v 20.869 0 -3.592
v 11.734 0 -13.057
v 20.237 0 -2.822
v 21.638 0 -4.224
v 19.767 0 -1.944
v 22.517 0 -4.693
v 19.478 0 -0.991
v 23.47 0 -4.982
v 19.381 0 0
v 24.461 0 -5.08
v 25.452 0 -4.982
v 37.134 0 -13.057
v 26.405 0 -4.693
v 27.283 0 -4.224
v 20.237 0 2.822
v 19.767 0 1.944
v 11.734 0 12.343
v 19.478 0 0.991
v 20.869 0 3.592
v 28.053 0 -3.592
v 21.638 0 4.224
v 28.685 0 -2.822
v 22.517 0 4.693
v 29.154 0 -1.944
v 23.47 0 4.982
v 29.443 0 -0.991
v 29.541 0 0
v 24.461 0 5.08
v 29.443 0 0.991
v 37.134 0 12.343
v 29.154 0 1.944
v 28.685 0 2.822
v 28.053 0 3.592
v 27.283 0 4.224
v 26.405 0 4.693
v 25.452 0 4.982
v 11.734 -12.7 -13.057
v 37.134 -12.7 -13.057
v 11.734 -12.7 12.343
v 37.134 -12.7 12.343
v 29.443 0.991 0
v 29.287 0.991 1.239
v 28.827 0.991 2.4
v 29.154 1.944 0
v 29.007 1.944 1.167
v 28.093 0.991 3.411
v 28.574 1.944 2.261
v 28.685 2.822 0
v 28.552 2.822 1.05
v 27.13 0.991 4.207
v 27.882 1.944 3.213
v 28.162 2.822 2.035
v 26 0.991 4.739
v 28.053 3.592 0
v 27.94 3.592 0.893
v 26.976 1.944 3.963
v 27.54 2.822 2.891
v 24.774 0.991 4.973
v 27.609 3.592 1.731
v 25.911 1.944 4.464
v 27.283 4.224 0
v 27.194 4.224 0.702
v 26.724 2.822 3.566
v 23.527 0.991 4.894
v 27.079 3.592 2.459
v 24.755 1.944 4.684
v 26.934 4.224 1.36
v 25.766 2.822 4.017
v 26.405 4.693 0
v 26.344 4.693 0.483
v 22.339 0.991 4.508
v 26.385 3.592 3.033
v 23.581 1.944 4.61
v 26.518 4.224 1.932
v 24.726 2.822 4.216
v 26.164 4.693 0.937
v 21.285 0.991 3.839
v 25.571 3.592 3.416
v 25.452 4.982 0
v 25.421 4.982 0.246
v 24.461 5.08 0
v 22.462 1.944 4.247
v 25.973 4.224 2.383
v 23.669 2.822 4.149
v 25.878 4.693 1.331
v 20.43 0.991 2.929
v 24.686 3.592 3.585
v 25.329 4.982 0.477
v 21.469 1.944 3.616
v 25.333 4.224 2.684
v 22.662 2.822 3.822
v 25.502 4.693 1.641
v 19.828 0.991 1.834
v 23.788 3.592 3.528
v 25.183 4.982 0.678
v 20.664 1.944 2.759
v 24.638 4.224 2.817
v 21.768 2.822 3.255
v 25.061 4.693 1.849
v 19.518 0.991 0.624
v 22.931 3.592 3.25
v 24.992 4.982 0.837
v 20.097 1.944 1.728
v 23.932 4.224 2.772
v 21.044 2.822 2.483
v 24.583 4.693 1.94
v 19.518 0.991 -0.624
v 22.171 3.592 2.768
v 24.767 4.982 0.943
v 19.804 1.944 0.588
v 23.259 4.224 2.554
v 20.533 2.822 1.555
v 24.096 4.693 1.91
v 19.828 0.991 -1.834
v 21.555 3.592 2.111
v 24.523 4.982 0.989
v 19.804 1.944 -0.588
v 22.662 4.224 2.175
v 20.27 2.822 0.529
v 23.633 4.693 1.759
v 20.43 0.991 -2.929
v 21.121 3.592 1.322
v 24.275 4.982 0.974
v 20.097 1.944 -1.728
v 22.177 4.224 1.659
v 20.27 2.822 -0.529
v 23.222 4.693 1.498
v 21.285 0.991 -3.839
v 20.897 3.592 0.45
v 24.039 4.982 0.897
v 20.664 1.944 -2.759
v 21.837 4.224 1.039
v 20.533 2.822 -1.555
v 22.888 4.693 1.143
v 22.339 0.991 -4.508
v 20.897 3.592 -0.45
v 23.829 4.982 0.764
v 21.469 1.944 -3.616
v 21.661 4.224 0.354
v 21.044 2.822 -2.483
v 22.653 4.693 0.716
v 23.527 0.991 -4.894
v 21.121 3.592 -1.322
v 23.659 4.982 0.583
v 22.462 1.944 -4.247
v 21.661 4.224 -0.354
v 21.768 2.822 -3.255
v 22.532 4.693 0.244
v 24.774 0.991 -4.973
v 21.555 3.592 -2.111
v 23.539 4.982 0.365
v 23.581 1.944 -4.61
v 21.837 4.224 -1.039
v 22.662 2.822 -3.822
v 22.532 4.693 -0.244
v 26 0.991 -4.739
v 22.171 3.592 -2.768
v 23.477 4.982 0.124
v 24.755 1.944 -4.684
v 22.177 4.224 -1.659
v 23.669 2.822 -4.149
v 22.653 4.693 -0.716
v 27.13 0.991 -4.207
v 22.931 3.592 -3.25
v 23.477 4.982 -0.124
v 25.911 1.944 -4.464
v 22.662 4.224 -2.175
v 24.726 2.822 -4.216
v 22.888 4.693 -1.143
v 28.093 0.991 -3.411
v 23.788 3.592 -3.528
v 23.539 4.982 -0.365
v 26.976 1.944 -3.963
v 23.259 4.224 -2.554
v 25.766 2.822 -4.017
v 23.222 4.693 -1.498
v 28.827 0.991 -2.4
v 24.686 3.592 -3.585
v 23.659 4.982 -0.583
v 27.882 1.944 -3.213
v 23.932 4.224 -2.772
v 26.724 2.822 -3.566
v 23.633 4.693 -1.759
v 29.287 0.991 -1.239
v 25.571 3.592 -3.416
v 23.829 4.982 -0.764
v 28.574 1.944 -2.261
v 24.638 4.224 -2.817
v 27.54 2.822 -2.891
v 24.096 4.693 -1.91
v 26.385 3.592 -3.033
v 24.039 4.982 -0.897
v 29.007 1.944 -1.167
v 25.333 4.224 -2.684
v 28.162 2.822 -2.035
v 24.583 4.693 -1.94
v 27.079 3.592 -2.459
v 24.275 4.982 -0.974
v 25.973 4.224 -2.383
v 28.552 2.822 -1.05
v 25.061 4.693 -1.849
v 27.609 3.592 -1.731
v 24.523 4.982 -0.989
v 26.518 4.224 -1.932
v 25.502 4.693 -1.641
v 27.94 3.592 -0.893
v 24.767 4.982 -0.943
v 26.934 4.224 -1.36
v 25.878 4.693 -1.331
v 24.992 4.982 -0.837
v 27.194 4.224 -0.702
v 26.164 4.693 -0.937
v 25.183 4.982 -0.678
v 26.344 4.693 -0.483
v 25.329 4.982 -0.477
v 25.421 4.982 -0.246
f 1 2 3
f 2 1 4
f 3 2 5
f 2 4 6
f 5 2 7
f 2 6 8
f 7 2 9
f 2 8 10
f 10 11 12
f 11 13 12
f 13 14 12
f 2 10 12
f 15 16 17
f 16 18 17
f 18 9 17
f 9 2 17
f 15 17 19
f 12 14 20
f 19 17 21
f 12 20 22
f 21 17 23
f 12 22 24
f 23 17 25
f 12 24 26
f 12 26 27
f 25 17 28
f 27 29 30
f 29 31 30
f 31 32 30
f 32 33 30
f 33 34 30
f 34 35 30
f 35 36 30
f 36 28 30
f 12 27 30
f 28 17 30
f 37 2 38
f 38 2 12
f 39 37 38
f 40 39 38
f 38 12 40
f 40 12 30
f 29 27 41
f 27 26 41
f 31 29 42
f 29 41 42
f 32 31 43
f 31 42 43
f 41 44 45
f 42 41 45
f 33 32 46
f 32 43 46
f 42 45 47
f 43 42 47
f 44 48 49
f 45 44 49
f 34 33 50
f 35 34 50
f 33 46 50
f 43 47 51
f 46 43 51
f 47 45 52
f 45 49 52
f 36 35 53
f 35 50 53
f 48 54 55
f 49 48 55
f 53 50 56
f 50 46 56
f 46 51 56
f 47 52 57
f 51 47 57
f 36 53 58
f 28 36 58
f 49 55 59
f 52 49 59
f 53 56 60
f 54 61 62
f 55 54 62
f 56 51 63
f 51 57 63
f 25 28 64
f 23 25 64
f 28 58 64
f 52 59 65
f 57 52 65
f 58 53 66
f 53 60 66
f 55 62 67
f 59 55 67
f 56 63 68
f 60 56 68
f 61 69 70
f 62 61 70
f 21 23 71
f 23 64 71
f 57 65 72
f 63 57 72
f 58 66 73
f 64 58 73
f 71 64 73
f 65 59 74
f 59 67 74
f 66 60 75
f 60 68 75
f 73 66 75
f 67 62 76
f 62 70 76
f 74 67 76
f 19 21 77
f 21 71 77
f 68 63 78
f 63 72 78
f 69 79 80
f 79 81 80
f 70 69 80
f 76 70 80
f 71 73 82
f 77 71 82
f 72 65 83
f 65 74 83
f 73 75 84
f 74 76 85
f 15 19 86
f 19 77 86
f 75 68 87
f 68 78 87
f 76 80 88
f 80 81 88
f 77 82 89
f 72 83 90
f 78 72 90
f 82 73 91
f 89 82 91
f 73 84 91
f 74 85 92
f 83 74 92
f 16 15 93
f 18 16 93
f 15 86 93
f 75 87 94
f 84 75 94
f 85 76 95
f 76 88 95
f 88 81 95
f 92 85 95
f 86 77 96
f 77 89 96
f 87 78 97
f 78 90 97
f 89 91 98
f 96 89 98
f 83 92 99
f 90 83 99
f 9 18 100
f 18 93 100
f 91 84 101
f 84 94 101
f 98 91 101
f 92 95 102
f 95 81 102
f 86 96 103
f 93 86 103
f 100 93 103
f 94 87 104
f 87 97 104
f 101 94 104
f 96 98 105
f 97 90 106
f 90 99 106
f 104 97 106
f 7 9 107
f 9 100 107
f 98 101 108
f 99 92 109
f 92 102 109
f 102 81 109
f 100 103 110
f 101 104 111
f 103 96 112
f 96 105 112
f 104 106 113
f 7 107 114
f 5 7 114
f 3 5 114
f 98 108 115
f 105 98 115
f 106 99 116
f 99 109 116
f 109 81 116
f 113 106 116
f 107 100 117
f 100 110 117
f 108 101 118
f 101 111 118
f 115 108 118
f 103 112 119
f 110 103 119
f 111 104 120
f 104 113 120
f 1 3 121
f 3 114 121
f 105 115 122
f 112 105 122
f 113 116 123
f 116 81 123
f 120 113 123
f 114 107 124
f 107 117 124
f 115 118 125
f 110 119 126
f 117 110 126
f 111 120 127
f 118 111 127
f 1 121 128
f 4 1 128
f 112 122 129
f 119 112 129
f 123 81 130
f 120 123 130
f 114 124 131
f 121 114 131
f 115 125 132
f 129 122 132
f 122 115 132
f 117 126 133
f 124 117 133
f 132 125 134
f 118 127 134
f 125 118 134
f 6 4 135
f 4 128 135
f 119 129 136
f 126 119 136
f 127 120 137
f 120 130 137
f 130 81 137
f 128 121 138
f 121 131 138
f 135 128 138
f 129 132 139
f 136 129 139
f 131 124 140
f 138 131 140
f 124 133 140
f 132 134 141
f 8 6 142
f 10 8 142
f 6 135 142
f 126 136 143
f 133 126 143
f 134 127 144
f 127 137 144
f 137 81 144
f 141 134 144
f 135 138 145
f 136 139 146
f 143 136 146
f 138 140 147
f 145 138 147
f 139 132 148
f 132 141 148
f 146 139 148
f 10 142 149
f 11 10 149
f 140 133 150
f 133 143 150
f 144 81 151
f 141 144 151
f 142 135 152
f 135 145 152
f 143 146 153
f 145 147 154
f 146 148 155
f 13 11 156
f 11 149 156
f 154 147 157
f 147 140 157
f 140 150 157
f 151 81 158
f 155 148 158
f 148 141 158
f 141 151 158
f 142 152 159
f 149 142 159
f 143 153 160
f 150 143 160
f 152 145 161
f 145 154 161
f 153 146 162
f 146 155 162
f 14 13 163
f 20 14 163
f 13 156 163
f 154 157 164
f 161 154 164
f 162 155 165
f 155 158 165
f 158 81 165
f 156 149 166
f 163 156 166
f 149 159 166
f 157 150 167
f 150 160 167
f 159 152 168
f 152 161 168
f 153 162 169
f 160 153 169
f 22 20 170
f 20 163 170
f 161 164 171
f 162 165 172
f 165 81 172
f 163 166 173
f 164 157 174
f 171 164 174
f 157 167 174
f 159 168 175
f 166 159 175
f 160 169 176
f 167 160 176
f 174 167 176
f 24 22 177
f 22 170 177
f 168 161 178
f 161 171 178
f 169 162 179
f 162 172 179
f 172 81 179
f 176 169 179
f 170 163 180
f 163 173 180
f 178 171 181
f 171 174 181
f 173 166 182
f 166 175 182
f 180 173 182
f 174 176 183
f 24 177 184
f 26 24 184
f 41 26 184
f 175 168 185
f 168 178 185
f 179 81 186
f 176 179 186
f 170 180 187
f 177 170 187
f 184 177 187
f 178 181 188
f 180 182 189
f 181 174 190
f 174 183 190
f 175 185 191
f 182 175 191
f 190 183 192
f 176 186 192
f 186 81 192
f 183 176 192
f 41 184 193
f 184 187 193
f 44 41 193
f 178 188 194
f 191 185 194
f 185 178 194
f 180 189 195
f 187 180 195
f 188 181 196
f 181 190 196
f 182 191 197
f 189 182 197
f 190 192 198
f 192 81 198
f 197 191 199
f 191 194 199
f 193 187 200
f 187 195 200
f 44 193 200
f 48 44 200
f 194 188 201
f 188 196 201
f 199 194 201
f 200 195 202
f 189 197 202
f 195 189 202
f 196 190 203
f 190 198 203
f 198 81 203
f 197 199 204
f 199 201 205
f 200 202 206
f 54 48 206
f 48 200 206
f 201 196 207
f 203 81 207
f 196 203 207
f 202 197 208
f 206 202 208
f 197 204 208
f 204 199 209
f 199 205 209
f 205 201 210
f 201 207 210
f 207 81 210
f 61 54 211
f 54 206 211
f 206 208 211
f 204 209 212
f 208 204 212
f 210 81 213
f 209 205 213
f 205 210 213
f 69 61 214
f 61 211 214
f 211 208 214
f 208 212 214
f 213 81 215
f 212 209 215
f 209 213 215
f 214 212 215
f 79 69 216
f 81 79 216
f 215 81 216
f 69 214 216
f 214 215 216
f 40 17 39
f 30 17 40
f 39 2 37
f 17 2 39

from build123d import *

# Parameters (mm, degrees)
F0_W     = 25.4
F0_H     = 25.4
F1_DEPTH = 12.7
F2_R     = 5.08
F3_DEPTH = 5.08
F4_R     = 5.07999


# Not quite as in the source:
# - a fillet or chamfer is up to 0.001 mm smaller than in the source, because OpenCascade refuses the exact size


with BuildPart() as f1:
    # F0 (on Front) → F1 (new body)
    with BuildSketch(Plane.XZ):
        with Locations((24.4342711151, -0.3571881309)):
            Rectangle(F0_W, F0_H)
    extrude(amount=F1_DEPTH)

    # F2 (on Front) → F3 (join)
    with BuildSketch(Plane.XZ):
        with Locations((24.4607284337, 0)):
            Circle(F2_R)
    extrude(amount=-F3_DEPTH)

    # F4 (radius 5.08 in the source; OpenCascade refuses exactly that, so slightly less here)
    f4_edges = [f1.edges().sort_by_distance(p)[0] for p in [
        (19.380728, 5.08, 0),
    ]]
    fillet(f4_edges, radius=F4_R)


solid = f1.part
